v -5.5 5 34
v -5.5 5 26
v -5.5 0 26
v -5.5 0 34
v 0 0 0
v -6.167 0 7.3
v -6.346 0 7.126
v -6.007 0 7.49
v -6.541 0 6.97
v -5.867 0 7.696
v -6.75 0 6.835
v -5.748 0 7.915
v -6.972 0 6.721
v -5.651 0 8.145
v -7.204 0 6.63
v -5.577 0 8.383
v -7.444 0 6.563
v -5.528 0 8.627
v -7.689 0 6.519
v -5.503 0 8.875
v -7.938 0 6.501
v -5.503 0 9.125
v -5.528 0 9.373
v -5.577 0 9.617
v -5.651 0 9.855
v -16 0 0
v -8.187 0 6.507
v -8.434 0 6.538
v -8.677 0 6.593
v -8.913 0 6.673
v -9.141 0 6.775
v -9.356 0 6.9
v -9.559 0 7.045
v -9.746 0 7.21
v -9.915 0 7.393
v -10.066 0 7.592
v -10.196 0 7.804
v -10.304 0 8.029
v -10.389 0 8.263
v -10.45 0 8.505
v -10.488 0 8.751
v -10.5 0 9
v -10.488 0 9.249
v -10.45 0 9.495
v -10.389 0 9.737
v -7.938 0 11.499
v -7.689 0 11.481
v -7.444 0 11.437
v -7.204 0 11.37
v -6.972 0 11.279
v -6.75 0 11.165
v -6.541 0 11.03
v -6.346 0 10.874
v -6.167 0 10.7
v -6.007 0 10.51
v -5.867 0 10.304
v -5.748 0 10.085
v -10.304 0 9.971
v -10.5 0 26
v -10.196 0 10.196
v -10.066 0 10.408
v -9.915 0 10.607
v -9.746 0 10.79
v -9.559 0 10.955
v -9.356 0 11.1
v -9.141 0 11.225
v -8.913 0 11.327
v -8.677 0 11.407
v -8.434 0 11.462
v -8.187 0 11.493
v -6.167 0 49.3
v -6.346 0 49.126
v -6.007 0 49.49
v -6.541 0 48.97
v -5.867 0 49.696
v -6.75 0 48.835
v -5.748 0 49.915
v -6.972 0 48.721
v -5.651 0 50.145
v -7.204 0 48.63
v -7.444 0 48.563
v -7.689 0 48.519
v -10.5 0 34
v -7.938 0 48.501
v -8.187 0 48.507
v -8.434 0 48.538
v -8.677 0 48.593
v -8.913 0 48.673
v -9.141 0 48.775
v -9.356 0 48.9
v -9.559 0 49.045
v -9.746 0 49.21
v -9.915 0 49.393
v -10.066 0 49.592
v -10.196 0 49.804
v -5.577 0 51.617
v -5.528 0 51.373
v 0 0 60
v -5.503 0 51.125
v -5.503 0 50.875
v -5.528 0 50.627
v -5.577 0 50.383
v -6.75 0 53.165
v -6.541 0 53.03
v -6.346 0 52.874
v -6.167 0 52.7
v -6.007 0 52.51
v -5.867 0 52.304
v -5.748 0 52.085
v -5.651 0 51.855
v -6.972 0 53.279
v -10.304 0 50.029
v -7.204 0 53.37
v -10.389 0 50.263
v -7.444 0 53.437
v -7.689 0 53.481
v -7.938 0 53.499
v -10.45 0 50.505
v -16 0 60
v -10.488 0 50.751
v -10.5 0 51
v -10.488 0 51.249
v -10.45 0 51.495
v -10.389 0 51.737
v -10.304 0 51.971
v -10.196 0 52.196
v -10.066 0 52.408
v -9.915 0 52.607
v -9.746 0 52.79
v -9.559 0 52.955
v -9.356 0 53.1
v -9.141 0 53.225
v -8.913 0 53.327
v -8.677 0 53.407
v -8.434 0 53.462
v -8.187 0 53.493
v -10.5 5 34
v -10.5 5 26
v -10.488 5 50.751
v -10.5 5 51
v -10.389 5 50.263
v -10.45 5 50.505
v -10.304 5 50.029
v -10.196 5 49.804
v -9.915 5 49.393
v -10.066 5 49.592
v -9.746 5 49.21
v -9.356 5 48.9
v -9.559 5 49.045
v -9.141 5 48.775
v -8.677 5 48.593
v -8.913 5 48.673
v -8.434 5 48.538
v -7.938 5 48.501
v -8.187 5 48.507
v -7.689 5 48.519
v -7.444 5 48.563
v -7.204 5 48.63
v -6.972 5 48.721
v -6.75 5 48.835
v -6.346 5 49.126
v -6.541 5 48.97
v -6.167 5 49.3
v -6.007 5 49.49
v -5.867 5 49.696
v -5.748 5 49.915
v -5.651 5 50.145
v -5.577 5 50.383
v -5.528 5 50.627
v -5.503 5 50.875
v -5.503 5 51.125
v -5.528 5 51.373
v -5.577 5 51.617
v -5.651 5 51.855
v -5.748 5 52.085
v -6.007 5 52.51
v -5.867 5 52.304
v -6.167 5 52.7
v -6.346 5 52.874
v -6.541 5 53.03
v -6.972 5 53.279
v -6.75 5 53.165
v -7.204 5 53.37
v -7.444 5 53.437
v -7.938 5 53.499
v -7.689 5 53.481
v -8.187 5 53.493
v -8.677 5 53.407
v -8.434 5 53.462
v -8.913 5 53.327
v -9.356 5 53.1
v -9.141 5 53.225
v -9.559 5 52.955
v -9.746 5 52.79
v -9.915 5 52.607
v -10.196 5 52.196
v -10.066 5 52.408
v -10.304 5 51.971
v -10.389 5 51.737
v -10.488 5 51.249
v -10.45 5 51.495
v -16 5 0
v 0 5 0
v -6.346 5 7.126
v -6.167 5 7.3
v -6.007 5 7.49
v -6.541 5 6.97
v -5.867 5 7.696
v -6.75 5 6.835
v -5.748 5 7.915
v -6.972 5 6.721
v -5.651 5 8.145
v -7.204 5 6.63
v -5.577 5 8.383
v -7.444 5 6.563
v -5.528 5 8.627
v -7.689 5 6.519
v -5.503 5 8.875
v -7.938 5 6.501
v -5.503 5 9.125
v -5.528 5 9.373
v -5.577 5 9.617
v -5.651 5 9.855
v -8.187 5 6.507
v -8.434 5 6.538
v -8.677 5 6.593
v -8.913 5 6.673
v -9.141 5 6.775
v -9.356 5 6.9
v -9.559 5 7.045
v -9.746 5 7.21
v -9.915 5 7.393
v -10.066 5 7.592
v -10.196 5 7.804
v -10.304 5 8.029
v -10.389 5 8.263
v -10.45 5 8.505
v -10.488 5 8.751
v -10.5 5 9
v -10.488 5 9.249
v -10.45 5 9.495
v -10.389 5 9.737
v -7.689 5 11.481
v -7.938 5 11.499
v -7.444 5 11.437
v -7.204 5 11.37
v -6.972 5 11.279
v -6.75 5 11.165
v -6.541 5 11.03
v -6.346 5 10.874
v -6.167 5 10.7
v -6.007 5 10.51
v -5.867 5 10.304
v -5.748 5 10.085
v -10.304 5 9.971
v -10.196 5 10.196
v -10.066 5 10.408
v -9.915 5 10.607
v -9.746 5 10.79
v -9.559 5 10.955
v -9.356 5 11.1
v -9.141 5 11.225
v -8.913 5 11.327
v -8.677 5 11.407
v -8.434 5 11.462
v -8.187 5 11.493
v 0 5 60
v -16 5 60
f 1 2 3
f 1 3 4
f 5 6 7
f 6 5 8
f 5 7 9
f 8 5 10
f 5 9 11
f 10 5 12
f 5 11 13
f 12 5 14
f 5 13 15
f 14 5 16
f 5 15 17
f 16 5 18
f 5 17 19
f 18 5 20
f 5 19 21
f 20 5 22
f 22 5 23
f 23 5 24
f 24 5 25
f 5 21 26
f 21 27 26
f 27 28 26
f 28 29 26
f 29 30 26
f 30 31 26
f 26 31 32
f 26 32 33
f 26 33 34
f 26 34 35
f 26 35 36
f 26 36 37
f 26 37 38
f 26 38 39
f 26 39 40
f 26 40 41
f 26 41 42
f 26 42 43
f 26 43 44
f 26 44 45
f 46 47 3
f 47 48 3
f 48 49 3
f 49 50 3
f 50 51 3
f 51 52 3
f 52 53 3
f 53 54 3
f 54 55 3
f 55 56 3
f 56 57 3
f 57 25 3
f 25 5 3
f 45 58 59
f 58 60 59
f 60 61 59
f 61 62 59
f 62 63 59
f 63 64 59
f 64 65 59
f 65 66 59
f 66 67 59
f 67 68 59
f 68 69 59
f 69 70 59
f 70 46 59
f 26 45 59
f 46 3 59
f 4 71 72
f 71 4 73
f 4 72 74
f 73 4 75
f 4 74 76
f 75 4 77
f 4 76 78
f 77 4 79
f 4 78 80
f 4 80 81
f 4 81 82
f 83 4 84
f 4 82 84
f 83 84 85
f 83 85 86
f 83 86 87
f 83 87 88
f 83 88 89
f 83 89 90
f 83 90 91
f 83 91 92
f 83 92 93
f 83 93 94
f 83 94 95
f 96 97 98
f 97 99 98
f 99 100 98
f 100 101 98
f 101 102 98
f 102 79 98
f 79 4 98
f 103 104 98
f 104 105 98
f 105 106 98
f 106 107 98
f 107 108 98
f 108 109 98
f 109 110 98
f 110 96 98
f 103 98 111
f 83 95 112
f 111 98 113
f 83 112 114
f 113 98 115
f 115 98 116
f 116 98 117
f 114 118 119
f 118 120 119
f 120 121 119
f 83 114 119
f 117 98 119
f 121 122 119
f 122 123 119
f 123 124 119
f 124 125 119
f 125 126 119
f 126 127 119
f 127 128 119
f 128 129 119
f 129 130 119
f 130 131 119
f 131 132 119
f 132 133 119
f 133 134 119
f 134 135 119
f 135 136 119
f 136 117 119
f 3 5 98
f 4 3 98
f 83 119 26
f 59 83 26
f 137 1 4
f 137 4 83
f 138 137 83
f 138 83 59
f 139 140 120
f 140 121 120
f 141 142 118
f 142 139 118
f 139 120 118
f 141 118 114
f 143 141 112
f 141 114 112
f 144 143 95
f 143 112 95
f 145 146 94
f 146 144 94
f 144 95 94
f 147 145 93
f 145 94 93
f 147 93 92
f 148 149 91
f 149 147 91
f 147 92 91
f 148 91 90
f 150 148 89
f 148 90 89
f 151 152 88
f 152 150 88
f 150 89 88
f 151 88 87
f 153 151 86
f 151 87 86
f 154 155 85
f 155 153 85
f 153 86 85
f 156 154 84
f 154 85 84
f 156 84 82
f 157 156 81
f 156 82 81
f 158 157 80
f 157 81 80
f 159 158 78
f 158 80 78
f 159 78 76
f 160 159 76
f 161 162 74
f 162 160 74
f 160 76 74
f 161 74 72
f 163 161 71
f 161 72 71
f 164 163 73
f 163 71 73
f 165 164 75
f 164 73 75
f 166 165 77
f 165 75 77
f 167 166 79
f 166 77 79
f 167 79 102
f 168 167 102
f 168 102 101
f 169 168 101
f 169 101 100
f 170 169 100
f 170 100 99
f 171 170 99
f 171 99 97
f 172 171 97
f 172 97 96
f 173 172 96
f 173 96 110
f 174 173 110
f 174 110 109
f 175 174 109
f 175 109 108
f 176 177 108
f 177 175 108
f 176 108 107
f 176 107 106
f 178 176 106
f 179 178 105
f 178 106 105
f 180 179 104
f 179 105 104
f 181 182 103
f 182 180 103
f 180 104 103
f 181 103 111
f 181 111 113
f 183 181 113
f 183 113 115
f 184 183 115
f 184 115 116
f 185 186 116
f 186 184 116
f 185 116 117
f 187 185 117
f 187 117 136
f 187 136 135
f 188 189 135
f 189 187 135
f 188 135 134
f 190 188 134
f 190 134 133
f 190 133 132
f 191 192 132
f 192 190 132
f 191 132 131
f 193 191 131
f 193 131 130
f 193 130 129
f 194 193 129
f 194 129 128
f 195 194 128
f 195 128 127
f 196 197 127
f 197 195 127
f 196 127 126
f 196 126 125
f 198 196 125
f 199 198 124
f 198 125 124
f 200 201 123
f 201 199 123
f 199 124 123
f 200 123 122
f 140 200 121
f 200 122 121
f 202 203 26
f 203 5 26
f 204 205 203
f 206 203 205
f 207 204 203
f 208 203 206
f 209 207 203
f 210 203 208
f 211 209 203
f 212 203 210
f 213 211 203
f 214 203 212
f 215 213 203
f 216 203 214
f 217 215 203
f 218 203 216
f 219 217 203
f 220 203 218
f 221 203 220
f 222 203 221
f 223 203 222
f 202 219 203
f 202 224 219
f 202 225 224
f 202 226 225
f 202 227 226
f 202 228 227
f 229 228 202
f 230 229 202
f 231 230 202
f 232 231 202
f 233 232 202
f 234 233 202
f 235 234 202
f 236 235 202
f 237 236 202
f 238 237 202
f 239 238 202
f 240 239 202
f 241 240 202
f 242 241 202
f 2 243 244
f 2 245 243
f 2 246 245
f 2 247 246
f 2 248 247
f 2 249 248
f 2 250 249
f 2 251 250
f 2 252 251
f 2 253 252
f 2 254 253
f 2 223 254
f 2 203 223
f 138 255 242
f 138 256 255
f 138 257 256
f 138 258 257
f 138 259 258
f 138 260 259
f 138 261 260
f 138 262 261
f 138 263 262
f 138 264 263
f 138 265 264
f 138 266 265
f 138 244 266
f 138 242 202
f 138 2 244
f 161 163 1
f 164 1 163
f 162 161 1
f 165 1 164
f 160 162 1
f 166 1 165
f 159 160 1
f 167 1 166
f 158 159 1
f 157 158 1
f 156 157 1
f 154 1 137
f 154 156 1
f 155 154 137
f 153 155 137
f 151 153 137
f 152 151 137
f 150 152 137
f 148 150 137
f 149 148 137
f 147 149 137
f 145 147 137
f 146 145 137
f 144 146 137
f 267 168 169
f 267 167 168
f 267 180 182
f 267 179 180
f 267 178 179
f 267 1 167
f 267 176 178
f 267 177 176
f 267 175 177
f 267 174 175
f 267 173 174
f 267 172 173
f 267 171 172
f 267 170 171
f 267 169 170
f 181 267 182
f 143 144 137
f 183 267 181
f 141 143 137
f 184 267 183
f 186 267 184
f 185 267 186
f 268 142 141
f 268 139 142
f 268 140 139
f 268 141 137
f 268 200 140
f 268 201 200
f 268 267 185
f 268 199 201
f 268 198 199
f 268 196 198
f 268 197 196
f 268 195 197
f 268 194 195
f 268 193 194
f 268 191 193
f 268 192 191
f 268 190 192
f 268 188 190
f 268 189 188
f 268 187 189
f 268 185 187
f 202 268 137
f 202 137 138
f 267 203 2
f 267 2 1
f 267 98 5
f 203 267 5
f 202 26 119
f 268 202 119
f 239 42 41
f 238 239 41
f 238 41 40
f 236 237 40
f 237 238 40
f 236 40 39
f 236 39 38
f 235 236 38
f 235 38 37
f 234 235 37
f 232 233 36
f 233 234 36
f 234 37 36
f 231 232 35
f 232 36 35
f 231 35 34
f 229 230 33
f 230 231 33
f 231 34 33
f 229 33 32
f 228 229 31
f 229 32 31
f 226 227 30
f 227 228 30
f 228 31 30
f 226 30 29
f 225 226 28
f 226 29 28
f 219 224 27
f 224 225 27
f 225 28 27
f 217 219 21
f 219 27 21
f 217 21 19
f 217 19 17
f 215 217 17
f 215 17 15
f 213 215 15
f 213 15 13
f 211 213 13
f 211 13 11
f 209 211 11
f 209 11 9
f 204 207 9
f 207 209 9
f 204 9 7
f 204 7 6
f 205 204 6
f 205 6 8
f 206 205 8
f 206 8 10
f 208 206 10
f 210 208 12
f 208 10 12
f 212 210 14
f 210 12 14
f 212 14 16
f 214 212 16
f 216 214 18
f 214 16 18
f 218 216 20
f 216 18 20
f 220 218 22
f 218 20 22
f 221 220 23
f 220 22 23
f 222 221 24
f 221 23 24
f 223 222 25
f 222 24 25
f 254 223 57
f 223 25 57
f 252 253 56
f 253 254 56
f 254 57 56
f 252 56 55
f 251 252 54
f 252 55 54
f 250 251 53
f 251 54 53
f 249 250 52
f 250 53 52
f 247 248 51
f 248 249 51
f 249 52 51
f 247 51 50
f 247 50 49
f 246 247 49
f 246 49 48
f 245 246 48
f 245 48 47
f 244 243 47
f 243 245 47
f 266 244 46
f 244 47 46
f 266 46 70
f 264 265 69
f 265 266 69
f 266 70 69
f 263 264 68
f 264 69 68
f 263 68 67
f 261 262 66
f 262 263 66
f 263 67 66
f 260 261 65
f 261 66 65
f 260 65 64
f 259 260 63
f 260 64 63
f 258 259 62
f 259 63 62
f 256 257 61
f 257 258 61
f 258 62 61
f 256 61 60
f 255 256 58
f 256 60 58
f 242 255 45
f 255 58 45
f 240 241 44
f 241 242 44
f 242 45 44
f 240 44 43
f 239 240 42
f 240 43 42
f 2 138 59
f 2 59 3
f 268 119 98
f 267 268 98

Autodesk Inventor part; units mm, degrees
ref_plane "YZ Plane" through (0, 0, 0) normal (1, 0, 0) x (0, 1, 0)
ref_plane "XZ Plane" through (0, 0, 0) normal (0, 1, 0) x (-1, 0, 0)
ref_plane "XY Plane" through (0, 0, 0) normal (0, 0, 1) x (1, 0, 0)
sketch "Sketch1" plane through (0, 0, 0) normal (0, 1, 0) x (-1, 0, 0)
  line L0 (0, 0) -> (16, 0)
  line L1 (16, 0) -> (16, 60)
  line L2 (16, 60) -> (0, 60)
  line L3 (0, 60) -> (0, 0)
  circle A0 centre (8, 51) radius 2.5
  circle A1 centre (8, 9) radius 2.5
  dimension "d2" = 60
  dimension "d3" = 16
  dimension "d4" = 8
  dimension "d5" = 5
  dimension "d6" = 9
  dimension "d7" = 8
  dimension "d8" = 9
  dimension "d9" = 5
extrude "Extrusion1" add sketch "Sketch1" along normal blind 5
sketch "Sketch2" plane through (0, 5, 0) normal (0, 1, 0) x (1, 0, 0)
  line L0 (-10.5, -26) -> (-5.5, -26)
  line L1 (-5.5, -26) -> (-5.5, -34)
  line L2 (-5.5, -34) -> (-10.5, -34)
  line L3 (-10.5, -34) -> (-10.5, -26)
  line L4 (-16, 0) -> (-16, -60) projected
  line L5 (-16, -60) -> (0, -60) projected
  line L6 (0, -60) -> (0, 0) projected
  dimension "d10" = 8
  dimension "d11" = 5
  dimension "d13" = 26
  dimension "d16" = 5.5
extrude "Extrusion2" cut sketch "Sketch2" against normal through all
properties part number "holder_sideblock"
